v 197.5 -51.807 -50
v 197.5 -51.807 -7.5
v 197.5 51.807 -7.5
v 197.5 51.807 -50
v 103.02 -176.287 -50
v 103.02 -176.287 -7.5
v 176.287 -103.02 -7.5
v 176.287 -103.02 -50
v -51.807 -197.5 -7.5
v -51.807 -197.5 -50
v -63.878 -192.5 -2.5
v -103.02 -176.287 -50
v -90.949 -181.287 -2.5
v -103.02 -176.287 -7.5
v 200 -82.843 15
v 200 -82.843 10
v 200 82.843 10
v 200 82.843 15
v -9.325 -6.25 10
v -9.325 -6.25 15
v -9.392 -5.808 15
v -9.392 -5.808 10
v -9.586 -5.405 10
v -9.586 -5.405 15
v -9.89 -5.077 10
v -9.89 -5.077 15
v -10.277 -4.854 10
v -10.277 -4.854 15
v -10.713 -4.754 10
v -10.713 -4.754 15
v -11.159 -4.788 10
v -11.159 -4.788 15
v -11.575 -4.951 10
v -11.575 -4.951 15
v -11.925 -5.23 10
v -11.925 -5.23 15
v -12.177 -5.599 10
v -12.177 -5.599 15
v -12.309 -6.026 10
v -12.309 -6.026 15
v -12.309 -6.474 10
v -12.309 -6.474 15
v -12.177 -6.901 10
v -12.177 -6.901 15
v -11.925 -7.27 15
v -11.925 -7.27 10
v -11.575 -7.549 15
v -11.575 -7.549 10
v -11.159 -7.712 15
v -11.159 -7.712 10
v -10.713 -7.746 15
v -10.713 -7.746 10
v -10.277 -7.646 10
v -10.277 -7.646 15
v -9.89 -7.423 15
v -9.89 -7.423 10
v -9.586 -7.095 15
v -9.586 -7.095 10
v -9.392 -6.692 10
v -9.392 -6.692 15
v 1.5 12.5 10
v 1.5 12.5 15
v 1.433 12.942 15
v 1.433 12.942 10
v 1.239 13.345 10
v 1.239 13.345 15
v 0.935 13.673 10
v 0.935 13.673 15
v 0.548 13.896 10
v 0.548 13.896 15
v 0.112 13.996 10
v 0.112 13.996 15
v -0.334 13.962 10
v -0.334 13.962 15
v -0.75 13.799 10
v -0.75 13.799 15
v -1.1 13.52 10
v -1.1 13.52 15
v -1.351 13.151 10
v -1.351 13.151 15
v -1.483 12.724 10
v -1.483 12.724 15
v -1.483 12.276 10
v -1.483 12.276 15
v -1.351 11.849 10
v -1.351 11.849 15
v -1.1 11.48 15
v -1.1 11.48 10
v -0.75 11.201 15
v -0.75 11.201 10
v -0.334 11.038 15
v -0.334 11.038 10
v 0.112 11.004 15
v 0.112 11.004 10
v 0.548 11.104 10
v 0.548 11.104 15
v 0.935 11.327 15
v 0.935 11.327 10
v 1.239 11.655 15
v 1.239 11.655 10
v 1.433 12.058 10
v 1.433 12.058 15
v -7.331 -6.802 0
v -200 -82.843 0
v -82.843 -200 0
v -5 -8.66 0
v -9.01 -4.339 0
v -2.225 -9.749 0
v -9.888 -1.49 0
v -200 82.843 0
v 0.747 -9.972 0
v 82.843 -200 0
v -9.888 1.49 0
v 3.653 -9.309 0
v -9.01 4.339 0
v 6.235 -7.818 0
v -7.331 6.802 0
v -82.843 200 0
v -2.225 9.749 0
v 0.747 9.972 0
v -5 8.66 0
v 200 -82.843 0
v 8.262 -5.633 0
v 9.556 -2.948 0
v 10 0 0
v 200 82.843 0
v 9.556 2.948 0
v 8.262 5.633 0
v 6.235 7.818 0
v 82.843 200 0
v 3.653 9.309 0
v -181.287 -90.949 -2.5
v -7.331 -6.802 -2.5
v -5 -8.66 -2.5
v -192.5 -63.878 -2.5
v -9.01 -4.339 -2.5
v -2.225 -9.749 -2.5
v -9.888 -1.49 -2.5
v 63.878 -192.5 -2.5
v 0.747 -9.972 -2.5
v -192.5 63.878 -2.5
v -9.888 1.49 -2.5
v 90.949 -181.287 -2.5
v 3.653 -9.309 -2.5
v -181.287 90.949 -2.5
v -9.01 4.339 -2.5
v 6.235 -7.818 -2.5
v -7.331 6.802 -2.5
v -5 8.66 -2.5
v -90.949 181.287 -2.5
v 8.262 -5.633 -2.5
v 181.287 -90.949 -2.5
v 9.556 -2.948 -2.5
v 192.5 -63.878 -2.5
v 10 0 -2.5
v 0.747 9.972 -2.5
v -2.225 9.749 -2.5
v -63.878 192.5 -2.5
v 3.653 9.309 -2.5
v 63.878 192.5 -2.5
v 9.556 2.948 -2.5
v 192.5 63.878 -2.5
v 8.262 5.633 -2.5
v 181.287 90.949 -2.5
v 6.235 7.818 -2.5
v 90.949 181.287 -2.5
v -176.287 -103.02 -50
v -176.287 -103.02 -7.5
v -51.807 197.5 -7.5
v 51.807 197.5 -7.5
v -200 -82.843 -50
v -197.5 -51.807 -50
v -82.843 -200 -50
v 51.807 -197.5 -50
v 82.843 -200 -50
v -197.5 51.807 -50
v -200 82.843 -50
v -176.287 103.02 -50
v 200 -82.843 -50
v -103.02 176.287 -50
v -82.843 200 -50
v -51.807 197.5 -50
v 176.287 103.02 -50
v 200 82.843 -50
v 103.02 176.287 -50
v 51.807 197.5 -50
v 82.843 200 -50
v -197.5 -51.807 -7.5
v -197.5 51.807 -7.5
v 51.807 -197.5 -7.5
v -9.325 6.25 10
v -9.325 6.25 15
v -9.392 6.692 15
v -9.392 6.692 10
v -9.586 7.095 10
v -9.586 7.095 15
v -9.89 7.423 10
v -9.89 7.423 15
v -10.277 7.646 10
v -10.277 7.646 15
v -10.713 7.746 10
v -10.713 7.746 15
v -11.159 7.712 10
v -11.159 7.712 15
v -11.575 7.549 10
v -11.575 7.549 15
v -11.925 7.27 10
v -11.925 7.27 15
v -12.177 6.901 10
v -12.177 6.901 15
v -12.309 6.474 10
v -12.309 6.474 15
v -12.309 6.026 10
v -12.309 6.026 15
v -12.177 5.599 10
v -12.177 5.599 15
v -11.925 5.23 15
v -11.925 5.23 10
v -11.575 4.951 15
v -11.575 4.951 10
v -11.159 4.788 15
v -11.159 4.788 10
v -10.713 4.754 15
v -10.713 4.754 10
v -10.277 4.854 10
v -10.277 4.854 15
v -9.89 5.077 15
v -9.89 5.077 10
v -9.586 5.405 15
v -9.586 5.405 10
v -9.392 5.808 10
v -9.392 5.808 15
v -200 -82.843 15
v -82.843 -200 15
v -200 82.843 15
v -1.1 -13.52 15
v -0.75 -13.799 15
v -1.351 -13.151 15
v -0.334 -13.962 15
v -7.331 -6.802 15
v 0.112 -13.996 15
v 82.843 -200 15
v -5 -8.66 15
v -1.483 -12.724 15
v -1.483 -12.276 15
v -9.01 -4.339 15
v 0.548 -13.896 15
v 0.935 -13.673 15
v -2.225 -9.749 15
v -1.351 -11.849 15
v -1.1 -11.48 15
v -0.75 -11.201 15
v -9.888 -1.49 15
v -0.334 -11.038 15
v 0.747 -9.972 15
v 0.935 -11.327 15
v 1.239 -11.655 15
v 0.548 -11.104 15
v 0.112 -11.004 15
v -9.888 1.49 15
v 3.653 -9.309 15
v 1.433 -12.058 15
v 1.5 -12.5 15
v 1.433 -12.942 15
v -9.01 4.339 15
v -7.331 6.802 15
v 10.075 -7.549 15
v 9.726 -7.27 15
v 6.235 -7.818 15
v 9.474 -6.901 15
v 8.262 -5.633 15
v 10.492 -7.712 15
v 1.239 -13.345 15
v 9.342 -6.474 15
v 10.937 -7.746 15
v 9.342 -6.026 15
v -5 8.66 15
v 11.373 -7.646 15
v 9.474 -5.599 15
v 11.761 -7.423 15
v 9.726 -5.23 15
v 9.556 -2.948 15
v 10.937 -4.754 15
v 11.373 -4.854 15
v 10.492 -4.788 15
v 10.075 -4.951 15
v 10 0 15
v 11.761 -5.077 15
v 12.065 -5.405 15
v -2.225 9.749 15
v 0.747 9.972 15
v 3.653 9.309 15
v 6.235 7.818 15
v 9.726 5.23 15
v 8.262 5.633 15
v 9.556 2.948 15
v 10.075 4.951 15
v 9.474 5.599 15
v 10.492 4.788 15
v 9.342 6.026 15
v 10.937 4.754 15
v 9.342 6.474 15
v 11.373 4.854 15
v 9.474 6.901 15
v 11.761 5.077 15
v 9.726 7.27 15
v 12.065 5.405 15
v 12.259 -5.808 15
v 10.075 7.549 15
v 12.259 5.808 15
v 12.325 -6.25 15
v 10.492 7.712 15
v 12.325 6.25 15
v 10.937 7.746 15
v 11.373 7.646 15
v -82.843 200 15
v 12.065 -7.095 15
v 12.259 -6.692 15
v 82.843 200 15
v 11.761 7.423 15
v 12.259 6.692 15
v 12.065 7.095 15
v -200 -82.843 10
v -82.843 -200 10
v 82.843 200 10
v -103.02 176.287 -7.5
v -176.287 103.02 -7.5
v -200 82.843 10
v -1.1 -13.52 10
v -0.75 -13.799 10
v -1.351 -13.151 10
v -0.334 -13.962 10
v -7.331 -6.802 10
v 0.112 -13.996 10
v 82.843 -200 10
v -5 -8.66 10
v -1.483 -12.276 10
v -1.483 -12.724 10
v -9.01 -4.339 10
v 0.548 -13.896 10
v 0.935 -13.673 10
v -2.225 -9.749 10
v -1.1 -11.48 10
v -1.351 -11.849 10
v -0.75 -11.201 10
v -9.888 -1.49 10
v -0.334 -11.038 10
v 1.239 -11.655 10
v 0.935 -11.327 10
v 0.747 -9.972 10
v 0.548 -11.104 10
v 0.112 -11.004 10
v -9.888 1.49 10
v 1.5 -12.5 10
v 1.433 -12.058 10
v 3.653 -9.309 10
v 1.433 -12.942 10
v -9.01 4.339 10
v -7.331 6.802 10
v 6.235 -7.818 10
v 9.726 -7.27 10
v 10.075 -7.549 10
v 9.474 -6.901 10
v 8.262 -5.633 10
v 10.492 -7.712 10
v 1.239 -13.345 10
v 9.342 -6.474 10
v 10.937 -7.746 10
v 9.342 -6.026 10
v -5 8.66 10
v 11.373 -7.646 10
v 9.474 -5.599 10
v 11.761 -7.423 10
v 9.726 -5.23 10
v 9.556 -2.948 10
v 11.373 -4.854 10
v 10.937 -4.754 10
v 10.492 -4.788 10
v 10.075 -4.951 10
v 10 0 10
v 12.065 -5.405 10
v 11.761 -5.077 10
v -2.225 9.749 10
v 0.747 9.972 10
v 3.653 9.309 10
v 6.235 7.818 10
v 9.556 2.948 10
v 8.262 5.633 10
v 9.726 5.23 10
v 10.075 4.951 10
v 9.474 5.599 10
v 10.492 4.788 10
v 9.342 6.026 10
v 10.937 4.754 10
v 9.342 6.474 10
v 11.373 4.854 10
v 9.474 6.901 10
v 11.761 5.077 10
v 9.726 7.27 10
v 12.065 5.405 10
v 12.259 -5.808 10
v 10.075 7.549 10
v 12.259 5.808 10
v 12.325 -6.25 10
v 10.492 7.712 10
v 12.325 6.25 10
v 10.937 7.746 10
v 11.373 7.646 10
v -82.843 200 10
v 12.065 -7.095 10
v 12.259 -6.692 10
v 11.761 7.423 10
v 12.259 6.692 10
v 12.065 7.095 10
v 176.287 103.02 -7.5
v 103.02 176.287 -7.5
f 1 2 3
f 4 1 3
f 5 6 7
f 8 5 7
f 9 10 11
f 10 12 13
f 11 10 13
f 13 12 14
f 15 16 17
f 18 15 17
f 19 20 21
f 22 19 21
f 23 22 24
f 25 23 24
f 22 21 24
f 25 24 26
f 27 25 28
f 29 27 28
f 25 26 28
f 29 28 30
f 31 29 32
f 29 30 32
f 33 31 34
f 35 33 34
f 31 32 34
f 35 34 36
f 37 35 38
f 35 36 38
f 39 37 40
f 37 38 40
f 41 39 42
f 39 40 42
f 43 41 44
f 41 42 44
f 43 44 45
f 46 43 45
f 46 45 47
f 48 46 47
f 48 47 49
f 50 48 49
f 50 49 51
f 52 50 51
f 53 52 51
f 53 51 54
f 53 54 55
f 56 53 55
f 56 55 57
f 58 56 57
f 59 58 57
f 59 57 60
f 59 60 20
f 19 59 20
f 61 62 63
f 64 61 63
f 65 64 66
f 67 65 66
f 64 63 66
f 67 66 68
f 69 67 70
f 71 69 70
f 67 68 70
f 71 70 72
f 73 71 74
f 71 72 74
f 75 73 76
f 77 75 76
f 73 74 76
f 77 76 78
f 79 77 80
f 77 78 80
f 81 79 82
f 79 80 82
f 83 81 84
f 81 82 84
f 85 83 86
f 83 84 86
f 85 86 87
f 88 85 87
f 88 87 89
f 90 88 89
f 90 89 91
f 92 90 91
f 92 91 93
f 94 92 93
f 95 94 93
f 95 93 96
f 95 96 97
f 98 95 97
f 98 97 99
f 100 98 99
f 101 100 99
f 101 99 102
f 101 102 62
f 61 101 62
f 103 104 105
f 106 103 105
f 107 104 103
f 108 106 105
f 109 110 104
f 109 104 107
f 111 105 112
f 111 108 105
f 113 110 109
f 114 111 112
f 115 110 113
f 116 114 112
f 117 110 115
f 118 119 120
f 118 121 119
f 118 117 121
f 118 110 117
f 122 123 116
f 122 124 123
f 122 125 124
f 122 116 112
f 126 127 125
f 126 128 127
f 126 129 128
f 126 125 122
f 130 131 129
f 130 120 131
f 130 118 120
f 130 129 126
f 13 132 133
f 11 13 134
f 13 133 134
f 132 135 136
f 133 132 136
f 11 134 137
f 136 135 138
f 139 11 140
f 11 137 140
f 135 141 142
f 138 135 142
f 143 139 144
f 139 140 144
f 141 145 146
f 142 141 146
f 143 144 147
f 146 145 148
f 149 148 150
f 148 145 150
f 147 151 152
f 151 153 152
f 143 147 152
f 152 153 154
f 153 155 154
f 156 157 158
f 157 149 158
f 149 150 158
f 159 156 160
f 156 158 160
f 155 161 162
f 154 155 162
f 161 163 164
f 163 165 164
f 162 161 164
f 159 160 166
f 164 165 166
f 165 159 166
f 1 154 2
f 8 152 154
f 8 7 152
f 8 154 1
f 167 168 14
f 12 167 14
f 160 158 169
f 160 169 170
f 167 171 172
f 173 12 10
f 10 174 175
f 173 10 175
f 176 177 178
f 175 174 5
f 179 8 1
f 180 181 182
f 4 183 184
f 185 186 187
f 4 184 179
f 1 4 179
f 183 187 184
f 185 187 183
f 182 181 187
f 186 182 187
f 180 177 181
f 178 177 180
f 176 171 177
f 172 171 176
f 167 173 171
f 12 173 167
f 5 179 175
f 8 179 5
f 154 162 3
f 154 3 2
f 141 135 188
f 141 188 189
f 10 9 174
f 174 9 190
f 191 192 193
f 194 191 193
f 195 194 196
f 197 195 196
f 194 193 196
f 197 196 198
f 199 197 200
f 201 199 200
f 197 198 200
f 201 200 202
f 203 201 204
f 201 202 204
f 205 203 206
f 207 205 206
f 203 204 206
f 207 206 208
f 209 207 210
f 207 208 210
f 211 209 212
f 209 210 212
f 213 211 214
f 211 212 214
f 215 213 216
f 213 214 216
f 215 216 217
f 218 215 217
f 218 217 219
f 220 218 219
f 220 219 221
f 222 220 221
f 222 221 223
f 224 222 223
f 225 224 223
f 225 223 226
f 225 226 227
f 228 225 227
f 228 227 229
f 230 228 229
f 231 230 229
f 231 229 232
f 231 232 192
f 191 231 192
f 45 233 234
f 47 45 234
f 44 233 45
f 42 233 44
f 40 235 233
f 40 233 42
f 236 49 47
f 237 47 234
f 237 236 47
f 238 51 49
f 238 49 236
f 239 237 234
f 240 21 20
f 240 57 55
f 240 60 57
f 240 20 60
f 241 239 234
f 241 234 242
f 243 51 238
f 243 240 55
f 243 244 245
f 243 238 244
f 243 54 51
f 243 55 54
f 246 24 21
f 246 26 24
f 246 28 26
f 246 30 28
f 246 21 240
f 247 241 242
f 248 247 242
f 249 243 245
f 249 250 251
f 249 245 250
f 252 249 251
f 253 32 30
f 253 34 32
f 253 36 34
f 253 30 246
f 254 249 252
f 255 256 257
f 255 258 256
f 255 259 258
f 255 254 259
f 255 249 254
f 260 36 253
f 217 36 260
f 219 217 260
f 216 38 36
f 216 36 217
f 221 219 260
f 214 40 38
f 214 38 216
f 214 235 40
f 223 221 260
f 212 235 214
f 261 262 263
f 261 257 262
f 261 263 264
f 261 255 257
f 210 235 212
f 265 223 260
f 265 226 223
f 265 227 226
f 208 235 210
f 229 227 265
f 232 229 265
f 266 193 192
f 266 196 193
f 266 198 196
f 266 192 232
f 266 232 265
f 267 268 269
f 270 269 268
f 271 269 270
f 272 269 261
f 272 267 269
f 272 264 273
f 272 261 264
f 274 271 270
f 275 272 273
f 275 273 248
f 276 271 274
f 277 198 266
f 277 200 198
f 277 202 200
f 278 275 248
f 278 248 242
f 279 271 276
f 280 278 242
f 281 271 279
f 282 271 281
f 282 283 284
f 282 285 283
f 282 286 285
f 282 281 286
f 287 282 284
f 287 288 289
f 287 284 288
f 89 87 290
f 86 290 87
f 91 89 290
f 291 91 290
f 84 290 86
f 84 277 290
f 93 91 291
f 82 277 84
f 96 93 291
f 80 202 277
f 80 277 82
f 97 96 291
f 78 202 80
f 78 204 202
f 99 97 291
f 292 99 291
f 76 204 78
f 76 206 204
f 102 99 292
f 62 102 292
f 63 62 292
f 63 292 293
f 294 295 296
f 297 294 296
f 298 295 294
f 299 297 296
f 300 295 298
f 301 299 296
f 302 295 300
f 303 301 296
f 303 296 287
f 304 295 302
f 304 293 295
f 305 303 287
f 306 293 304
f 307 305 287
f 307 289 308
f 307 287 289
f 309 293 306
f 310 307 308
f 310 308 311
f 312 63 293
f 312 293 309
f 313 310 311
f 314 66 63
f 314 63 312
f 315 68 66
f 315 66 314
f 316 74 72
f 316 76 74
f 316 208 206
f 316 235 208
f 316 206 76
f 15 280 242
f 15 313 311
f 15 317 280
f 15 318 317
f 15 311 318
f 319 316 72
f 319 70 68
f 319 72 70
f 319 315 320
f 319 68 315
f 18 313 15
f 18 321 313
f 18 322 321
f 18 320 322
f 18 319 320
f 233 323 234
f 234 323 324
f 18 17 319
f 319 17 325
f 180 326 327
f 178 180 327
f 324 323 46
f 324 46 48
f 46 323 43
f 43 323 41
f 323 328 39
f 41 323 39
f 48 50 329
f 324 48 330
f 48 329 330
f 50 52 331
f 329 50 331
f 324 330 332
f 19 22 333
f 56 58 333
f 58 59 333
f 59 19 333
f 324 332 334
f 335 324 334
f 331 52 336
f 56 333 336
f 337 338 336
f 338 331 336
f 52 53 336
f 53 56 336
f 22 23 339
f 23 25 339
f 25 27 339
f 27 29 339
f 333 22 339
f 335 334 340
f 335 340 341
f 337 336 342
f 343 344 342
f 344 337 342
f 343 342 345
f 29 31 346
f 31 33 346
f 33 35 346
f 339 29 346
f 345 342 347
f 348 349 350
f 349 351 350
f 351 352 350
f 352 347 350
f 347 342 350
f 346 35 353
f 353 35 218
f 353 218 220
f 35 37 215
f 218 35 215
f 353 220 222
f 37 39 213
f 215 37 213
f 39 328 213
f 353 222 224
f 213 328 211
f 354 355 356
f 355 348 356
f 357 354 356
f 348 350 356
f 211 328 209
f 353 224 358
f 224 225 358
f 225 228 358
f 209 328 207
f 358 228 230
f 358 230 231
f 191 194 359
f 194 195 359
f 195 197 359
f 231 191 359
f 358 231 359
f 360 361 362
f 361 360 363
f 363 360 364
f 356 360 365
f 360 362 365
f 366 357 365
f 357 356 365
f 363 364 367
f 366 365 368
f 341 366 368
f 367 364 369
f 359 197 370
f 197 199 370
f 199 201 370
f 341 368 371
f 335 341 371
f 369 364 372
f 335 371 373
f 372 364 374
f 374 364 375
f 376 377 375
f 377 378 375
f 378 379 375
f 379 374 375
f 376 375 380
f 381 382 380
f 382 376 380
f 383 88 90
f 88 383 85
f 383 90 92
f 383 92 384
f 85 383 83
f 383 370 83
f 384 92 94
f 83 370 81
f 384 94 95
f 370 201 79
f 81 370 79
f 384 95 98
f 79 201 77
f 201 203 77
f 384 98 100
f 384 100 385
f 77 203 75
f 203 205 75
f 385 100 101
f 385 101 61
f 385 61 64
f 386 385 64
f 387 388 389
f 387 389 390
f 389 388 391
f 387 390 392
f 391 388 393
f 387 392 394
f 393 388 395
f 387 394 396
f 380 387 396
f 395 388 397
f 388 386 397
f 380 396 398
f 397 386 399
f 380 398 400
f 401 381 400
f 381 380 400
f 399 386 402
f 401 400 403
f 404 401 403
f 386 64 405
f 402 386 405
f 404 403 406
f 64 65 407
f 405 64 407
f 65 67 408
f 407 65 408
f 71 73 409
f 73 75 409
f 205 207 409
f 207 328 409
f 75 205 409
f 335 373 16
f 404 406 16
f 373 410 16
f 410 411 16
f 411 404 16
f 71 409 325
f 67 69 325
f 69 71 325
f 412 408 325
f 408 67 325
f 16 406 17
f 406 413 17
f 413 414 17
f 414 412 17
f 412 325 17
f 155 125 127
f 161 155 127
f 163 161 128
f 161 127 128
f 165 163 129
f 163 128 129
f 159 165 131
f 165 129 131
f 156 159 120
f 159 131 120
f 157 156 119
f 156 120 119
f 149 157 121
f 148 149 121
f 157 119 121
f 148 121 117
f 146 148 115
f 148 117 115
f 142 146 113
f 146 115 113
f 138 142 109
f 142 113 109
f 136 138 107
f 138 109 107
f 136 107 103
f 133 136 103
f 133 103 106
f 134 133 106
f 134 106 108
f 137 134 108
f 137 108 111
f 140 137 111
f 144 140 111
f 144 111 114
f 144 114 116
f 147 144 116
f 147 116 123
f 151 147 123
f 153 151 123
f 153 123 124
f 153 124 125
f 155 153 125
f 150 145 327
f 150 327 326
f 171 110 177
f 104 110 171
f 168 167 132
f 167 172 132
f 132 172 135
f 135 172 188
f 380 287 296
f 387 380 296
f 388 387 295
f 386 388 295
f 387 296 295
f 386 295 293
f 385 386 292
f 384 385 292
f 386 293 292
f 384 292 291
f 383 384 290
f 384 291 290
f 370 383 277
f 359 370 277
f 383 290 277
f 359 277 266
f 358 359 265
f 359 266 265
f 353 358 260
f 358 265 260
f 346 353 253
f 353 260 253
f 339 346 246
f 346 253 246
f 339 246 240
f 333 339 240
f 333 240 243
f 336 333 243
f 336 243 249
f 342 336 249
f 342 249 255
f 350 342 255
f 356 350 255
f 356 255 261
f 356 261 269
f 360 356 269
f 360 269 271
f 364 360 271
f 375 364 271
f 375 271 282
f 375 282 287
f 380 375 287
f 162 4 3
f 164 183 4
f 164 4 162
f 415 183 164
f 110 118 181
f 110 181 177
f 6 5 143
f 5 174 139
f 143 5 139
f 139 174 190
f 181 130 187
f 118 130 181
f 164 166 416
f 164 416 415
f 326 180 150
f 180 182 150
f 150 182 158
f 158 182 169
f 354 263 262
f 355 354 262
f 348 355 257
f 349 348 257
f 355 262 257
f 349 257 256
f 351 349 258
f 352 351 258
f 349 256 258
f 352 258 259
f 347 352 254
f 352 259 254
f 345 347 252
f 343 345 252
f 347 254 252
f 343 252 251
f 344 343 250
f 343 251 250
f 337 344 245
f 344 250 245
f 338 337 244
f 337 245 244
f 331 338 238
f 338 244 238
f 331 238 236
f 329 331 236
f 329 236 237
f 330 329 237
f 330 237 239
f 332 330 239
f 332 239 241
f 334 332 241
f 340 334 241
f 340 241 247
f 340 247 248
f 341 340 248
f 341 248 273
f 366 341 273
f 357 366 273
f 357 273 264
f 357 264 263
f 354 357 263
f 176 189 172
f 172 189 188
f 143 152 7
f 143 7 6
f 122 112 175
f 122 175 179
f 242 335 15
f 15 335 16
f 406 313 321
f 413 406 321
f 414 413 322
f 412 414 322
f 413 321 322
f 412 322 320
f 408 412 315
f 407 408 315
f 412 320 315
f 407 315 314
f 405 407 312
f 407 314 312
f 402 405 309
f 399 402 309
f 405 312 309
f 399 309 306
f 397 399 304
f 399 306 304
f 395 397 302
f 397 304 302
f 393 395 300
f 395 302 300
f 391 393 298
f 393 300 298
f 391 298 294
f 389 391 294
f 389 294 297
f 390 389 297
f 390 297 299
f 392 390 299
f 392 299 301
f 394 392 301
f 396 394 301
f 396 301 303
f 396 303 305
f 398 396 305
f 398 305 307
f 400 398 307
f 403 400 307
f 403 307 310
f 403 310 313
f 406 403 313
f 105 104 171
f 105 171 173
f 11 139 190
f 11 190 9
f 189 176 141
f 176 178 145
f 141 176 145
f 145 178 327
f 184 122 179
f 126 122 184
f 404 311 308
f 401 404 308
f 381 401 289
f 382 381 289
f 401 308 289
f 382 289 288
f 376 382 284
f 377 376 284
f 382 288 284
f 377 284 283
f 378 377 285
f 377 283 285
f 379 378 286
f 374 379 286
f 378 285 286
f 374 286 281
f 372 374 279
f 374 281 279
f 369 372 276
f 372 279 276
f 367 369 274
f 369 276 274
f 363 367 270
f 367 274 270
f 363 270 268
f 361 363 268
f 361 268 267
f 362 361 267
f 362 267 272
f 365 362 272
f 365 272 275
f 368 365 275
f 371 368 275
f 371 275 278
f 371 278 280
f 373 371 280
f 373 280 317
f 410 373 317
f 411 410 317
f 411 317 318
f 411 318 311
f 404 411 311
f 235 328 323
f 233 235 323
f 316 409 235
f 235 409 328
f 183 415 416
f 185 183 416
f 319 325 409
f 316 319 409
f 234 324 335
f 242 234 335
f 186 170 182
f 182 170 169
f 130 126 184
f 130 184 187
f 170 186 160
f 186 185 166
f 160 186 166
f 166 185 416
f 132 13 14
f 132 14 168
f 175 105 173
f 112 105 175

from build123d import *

# Parameters (mm, degrees)
F1_DEPTH = 50
F3_START = 10
F3_DEPTH = 5
F4_T     = -2.5
F5_R     = 10
F6_DEPTH = 65.001
F7_R     = 1.5
F8_DEPTH = 15
F9_SIZE  = 30
F10_SIZE = 5


with BuildPart() as f1:
    # F0 (on Top) → F1 (new body)
    with BuildSketch(Plane.XY):
        Polygon((200, -82.8427124746), (200, 82.8427124746), (82.8427124746, 200), (-82.8427124746, 200), (-200, 82.8427124746), (-200, -82.8427124746), (-82.8427124746, -200), (82.8427124746, -200), align=None)
    extrude(amount=-F1_DEPTH)

    # F4
    f4_openings = [f1.faces().sort_by_distance(p)[0] for p in [
        (0, 0, -50),
    ]]
    offset(amount=F4_T, openings=f4_openings)


with BuildPart() as f3:
    # F2 (on face) → F3 (new body)
    with BuildSketch(Plane.XY.offset(F3_START)):
        Polygon((82.8427124746, 200), (-82.8427124746, 200), (-200, 82.8427124746), (-200, -82.8427124746), (-82.8427124746, -200), (82.8427124746, -200), (200, -82.8427124746), (200, 82.8427124746), align=None)
    extrude(amount=F3_DEPTH)


with BuildPart() as f6_tool:
    # F5 (on face) → F6 (new body, through all)
    with BuildSketch(Plane.XY.offset(15)):
        Circle(F5_R)
    extrude(amount=-F6_DEPTH)


with BuildPart() as f1_1:
    add(f1.part)

    # F6: cut by f6_tool
    add(f6_tool.part, mode=Mode.SUBTRACT)

    # F9
    f9_edges = [f1_1.edges().sort_by_distance(p)[0] for p in [
        (-81.807179, -197.5, -26.25),
        (81.807179, -197.5, -26.25),
        (197.5, -81.807179, -26.25),
        (197.5, 81.807179, -26.25),
        (81.807179, 197.5, -26.25),
        (-81.807179, 197.5, -26.25),
        (-197.5, 81.807179, -26.25),
        (-197.5, -81.807179, -26.25),
    ]]
    chamfer(f9_edges, length=F9_SIZE)

    # F10
    f10_edges = [f1_1.edges().sort_by_distance(p)[0] for p in [
        (-139.653589, -139.653589, -2.5),
        (0, -197.5, -2.5),
        (139.653589, -139.653589, -2.5),
        (197.5, 0, -2.5),
        (139.653589, 139.653589, -2.5),
        (0, 197.5, -2.5),
        (-139.653589, 139.653589, -2.5),
        (-197.5, 0, -2.5),
    ]]
    chamfer(f10_edges, length=F10_SIZE)


with BuildPart() as f3_1:
    add(f3.part)

    # F6: cut by f6_tool
    add(f6_tool.part, mode=Mode.SUBTRACT)

    # F7 (on face) → F8 (cut)
    with BuildSketch(Plane.XY.offset(15)):
        with Locations((0, 12.5)):
            Circle(F7_R)
        with Locations((-10.8253174314, 6.2500002007)):
            Circle(F7_R)
        with Locations((-10.8253177791, -6.2499995985)):
            Circle(F7_R)
        with Locations((-6.954e-07, -12.5)):
            Circle(F7_R)
        with Locations((10.8253170837, -6.2500008029)):
            Circle(F7_R)
        with Locations((10.8253181268, 6.2499989963)):
            Circle(F7_R)
    extrude(amount=-F8_DEPTH, mode=Mode.SUBTRACT)


solid = Compound([f1_1.part, f3_1.part])
